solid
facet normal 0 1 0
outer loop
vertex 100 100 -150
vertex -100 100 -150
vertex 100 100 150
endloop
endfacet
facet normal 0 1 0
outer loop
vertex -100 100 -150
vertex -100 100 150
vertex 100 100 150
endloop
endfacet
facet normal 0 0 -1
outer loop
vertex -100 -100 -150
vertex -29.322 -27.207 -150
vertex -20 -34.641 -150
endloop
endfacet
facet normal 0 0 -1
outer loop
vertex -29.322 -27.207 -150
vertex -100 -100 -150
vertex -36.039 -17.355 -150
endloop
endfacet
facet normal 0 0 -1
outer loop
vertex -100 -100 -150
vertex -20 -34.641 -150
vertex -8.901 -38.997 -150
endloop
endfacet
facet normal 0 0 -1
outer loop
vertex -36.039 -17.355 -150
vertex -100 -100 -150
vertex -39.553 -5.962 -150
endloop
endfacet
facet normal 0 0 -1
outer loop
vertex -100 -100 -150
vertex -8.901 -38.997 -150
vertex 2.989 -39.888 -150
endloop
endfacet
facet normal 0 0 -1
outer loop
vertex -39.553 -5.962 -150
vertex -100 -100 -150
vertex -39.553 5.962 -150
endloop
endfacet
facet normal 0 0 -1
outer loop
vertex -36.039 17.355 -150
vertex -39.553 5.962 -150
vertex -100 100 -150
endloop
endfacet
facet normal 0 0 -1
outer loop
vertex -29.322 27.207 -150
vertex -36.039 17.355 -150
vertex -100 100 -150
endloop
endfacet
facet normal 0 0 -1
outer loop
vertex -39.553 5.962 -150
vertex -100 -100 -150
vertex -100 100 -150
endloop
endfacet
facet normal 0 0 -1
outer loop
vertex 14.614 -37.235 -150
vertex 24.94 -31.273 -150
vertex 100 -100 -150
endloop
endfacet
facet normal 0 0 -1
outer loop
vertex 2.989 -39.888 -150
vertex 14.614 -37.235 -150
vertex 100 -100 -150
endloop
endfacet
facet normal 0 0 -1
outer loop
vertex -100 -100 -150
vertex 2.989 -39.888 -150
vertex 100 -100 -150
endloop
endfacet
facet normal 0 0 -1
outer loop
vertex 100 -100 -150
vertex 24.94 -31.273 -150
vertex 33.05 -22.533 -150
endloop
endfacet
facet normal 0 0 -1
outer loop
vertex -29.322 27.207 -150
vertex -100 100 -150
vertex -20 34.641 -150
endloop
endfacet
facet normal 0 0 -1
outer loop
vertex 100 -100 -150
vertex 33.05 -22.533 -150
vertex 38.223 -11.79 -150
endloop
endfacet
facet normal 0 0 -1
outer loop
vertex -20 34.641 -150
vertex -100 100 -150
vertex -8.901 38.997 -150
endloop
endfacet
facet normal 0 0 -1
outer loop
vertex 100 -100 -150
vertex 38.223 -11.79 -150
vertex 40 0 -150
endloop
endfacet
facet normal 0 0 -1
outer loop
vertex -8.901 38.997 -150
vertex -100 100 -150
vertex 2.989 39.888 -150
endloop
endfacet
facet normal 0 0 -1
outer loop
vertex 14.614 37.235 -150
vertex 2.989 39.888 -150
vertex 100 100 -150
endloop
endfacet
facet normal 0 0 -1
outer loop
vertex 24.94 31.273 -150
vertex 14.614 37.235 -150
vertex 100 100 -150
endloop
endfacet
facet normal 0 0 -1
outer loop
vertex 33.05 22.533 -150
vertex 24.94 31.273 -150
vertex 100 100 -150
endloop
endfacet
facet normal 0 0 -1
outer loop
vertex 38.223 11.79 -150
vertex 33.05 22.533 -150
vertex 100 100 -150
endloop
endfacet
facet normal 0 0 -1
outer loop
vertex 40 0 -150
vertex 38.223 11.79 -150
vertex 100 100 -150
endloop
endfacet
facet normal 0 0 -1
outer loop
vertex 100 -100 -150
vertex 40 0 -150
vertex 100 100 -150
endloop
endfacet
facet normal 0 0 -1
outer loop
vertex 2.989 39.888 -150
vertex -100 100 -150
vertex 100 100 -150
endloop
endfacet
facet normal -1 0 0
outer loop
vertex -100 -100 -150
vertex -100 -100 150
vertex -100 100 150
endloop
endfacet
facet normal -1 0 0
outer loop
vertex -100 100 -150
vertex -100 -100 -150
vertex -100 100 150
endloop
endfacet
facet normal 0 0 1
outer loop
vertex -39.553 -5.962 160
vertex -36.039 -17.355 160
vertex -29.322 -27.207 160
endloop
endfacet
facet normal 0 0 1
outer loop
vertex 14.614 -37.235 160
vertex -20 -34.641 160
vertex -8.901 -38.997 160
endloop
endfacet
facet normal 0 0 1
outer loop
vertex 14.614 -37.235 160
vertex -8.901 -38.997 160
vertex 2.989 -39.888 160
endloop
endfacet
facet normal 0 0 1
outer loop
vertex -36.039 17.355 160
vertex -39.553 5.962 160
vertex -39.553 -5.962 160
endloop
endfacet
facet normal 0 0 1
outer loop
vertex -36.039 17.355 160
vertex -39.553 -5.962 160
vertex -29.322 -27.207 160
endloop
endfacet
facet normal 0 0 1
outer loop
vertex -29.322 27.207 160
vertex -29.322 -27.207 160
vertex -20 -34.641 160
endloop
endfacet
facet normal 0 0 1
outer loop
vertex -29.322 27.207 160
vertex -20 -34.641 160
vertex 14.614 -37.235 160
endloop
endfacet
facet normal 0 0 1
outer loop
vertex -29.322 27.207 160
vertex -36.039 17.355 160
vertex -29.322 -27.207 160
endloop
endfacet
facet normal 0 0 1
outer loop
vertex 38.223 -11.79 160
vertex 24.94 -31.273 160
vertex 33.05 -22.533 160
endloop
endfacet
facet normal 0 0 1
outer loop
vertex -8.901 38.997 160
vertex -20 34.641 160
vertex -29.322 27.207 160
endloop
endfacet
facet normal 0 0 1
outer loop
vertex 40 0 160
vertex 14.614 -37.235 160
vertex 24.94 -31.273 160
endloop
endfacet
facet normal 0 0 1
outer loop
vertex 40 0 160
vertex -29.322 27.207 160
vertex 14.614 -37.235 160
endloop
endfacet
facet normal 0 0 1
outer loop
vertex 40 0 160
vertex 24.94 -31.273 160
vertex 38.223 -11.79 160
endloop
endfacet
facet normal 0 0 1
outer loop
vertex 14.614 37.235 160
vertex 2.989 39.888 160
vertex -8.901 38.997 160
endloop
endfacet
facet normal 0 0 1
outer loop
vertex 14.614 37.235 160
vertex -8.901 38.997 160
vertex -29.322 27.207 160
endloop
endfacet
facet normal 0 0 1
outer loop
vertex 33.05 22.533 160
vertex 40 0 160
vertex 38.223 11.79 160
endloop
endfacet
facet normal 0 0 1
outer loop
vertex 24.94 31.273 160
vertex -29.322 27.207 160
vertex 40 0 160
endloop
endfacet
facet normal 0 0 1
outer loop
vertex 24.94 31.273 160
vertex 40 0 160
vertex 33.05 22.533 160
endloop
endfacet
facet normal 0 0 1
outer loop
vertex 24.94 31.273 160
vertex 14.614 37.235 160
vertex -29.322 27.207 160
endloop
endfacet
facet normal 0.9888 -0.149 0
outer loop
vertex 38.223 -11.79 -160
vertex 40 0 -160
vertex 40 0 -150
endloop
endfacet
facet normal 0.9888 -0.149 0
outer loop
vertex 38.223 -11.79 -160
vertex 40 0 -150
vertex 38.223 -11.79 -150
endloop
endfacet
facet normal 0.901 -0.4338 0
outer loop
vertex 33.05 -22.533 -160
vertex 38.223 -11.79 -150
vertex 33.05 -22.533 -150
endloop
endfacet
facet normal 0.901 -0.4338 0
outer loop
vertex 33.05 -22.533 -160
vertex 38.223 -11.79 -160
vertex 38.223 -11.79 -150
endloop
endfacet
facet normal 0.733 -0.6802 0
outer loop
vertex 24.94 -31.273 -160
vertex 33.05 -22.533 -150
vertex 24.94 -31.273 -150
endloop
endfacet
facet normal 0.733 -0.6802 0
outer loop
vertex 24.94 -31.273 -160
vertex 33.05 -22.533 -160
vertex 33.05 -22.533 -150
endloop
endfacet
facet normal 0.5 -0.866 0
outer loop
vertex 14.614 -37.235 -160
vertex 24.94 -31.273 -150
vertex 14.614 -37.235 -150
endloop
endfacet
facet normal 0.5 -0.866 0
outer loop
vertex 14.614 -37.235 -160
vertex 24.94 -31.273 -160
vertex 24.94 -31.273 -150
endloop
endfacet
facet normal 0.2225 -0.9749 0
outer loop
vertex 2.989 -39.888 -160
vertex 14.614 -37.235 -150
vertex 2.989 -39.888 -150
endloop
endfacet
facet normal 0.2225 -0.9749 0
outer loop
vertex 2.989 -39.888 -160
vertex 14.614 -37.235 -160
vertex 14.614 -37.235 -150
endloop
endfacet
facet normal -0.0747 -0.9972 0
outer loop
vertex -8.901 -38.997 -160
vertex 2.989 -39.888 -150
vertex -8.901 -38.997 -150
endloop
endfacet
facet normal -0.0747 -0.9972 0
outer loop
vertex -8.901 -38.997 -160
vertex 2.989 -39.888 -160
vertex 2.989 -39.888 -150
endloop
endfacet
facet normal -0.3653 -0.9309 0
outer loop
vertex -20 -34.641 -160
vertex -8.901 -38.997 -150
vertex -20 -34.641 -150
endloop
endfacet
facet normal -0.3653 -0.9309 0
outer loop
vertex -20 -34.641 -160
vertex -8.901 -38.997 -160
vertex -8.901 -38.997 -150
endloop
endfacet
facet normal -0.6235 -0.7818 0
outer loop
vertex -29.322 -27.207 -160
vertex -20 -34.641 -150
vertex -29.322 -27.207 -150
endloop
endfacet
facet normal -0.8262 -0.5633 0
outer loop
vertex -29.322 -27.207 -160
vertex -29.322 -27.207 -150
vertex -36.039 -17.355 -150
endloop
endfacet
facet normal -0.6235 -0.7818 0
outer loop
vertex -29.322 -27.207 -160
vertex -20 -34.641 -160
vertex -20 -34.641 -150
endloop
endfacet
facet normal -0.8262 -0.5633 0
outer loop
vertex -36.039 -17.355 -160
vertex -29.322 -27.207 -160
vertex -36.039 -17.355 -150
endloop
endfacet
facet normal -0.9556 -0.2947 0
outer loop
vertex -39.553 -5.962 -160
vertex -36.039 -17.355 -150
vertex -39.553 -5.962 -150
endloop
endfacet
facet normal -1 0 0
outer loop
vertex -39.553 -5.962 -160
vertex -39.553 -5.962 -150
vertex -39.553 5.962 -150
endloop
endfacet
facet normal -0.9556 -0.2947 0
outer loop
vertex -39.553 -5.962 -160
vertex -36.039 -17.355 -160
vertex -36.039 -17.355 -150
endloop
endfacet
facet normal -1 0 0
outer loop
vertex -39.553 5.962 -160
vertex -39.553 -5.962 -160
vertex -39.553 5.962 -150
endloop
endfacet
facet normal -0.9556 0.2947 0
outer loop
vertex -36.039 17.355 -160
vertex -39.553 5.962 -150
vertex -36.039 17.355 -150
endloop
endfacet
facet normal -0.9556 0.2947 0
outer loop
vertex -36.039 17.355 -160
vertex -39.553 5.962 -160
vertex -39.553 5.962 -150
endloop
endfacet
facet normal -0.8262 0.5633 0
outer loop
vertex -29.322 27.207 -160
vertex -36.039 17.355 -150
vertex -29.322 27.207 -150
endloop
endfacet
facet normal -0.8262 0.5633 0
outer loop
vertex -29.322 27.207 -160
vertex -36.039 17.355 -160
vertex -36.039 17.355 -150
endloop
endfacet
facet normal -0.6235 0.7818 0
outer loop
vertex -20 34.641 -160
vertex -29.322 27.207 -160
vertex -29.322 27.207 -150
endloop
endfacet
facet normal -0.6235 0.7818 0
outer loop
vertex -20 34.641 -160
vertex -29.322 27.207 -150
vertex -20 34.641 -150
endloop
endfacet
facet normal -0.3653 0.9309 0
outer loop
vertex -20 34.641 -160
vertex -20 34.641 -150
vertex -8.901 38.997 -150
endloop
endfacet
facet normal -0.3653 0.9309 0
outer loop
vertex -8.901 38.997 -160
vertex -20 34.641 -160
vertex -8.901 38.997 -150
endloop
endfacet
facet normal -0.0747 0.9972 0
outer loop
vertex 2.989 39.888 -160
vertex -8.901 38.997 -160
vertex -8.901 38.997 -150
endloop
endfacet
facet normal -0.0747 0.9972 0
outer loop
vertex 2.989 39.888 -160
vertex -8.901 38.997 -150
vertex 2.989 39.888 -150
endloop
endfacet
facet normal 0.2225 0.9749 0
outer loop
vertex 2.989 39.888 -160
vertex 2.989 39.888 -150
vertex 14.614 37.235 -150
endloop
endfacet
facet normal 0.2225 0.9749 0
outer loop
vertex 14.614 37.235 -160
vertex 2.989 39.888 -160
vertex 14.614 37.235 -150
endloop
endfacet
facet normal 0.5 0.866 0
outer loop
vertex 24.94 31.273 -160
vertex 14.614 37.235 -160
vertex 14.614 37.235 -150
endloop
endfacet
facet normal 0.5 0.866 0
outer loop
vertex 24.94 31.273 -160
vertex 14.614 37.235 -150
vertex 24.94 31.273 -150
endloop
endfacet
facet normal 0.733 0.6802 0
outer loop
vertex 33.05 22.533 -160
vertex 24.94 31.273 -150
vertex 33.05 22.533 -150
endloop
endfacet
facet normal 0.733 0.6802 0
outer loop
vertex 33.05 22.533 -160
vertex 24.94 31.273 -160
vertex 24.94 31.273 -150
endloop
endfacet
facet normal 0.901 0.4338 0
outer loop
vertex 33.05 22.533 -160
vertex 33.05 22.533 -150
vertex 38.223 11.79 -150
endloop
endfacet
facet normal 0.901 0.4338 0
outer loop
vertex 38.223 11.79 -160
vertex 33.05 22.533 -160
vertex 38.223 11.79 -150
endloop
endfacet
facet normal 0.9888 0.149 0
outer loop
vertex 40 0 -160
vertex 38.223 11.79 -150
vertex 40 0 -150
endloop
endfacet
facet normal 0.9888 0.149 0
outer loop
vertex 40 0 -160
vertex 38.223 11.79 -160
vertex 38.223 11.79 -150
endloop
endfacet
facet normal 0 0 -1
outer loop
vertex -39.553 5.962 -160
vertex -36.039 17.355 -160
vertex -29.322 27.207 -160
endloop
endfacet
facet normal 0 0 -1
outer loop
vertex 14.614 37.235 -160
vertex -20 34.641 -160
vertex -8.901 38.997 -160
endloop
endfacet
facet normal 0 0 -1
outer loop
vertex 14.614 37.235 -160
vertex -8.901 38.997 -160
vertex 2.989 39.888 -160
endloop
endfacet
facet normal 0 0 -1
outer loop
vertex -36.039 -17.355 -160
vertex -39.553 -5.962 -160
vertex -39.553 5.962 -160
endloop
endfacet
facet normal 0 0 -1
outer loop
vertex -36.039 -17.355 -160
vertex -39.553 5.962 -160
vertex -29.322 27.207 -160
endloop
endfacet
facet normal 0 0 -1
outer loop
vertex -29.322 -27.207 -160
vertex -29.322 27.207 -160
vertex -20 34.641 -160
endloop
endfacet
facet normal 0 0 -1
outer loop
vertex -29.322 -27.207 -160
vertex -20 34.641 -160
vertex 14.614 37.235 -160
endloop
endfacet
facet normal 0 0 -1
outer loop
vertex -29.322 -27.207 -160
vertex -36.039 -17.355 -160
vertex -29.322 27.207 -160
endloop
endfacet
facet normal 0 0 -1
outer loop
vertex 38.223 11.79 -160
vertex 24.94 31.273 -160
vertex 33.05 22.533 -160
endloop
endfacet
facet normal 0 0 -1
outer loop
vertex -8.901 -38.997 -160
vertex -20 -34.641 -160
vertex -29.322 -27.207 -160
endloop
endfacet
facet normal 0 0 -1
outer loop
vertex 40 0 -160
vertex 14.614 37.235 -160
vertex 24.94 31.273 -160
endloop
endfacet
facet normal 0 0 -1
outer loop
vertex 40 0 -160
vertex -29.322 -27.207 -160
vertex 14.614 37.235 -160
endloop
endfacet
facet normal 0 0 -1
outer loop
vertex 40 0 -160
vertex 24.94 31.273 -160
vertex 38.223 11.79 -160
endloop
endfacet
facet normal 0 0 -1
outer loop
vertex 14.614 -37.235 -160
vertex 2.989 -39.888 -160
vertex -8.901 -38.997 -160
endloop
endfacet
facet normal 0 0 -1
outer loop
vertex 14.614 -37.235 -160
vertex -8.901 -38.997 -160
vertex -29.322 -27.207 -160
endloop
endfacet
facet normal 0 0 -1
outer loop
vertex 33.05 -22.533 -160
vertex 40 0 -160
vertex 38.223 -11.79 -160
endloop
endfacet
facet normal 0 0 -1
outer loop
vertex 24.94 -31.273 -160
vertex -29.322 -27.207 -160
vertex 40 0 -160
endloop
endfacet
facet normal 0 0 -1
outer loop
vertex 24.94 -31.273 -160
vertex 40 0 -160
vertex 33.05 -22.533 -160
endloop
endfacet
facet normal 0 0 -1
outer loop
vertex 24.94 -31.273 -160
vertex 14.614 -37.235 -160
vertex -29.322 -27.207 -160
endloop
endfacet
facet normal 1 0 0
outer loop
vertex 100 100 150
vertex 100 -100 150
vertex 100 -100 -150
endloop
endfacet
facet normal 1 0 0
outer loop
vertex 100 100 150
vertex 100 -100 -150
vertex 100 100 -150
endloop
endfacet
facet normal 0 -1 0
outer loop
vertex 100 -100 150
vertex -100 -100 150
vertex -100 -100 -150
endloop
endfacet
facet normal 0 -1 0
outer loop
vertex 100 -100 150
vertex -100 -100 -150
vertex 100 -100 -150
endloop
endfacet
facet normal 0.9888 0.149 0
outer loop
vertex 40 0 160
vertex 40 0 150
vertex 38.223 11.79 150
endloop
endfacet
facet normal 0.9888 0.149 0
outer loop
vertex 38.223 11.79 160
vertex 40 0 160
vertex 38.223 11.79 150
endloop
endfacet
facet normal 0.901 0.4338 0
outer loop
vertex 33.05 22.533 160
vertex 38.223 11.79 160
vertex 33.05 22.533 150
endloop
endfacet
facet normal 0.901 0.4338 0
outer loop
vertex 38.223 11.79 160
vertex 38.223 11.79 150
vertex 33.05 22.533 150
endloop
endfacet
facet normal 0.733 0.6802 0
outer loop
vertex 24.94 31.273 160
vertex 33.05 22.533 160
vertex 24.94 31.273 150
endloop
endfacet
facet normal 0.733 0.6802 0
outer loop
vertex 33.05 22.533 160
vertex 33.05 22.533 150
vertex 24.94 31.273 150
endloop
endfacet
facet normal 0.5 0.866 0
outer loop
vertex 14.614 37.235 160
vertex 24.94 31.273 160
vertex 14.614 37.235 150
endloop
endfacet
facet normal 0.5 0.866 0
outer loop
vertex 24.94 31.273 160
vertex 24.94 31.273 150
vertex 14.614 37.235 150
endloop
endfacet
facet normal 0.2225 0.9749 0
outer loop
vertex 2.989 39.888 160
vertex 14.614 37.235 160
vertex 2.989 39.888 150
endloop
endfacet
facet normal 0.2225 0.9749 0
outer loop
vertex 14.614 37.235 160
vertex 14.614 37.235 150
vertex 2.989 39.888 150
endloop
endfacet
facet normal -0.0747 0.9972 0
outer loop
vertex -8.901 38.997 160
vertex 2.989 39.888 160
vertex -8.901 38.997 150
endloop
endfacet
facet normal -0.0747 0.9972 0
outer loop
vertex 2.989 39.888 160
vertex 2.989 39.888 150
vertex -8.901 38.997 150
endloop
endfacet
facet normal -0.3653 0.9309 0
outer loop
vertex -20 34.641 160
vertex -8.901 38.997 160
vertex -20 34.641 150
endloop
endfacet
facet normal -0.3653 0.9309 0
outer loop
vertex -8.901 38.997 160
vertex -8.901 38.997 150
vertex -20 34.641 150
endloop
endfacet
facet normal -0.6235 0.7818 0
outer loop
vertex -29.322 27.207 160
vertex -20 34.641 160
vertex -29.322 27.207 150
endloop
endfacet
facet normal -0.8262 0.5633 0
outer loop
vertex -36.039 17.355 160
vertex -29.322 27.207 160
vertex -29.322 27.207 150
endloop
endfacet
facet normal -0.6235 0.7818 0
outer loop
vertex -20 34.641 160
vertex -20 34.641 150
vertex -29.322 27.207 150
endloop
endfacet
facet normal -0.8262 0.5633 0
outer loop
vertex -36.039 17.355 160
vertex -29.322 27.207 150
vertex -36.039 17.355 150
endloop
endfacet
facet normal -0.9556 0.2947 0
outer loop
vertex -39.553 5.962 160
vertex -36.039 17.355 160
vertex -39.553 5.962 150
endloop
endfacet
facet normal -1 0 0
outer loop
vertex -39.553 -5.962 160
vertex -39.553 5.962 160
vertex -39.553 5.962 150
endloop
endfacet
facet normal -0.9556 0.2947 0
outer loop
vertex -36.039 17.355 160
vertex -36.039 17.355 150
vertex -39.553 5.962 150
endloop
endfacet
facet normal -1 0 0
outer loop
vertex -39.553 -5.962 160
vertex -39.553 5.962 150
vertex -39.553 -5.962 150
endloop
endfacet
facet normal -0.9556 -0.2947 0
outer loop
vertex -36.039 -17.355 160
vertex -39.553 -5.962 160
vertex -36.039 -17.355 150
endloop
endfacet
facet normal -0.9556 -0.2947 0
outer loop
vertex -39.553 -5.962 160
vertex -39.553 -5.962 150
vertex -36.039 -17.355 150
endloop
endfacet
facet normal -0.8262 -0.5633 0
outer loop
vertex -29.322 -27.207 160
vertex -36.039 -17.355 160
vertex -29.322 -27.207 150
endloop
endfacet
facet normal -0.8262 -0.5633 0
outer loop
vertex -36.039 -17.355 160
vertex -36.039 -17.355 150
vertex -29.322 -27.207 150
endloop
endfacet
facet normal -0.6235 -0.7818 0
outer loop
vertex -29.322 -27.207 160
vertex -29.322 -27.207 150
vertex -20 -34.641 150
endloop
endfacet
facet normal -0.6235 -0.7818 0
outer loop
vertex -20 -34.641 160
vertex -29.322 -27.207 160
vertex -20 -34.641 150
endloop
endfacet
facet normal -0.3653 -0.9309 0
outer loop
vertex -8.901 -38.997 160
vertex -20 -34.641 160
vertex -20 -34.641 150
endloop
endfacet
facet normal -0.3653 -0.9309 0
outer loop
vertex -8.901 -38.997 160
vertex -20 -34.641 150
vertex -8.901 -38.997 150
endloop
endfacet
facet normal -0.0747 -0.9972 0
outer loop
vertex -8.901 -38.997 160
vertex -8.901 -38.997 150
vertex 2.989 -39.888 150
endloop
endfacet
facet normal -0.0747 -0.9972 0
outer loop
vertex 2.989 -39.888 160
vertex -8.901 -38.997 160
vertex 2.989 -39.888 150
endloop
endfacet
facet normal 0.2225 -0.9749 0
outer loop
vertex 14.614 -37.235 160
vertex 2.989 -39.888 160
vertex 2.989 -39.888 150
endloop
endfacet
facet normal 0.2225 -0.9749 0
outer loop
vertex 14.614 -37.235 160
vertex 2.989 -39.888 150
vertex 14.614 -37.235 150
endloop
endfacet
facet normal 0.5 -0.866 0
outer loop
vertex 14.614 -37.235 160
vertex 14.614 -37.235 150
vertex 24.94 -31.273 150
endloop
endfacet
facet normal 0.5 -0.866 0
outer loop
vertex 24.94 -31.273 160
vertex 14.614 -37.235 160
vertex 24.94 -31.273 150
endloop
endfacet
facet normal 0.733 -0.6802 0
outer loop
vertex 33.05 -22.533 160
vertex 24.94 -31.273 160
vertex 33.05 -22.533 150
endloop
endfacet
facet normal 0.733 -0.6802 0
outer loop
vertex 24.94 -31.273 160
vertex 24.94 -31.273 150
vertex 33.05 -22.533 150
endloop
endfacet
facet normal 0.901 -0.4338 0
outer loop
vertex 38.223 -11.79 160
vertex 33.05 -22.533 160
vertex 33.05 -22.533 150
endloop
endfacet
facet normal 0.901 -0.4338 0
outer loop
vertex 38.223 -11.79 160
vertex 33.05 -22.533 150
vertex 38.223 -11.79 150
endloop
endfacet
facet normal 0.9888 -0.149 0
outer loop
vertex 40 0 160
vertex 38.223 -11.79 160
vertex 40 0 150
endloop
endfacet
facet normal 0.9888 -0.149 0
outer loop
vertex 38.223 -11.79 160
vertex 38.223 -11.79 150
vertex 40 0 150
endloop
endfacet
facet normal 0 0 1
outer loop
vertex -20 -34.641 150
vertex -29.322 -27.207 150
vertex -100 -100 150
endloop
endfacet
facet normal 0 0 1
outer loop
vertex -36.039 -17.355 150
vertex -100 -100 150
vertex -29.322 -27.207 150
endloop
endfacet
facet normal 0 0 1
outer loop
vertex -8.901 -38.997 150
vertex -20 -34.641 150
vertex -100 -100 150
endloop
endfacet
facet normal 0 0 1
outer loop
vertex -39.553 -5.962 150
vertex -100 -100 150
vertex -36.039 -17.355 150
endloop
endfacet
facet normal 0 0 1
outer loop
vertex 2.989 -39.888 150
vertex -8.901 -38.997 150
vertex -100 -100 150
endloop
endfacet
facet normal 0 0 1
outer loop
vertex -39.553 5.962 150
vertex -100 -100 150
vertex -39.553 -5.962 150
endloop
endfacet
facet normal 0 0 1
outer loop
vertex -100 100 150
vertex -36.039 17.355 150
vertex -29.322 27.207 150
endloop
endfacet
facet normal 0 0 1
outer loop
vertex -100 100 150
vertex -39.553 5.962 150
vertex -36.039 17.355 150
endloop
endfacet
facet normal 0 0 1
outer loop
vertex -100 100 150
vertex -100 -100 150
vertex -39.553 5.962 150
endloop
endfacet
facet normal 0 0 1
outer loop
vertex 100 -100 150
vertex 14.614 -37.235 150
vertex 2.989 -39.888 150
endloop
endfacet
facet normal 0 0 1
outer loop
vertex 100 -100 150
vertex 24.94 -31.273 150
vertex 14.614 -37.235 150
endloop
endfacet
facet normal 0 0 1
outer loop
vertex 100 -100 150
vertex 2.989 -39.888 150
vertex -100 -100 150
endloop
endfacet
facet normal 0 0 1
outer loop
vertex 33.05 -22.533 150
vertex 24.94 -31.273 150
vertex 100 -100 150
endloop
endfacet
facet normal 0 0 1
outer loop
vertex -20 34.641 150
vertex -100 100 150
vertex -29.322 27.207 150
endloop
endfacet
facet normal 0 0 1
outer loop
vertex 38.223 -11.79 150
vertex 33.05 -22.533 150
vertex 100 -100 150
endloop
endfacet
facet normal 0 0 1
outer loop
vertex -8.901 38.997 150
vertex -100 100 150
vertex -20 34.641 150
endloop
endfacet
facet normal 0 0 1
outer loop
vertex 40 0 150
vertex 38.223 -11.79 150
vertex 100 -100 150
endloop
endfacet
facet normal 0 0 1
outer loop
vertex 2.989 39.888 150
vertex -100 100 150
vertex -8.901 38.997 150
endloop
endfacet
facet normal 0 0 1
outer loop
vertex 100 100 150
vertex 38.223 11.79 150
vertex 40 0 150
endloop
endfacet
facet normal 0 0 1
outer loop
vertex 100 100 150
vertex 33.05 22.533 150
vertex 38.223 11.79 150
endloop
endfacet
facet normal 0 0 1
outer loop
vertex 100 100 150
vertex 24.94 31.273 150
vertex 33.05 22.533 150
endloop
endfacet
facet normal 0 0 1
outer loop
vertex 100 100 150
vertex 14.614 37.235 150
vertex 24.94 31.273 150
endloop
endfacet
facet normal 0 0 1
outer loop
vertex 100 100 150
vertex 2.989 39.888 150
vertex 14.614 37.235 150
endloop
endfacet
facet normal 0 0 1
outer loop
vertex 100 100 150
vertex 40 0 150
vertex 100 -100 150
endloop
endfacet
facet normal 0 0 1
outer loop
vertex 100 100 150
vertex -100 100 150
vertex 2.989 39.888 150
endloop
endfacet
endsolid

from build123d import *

# Parameters (mm, degrees)
SKETCH_1_W      = 200
SKETCH_1_H      = 200
EXTRUDE_1_DEPTH = 150
SKETCH_2_R      = 40
EXTRUDE_2_DEPTH = 10
EXTRUDE_START   = 10
SKETCH_3_R      = 40
EXTRUDE_3_DEPTH = 10


with BuildPart() as part:
    # 草图1 → 凸台-拉伸1 (new, symmetric)
    with BuildSketch(Plane.XY):
        Rectangle(SKETCH_1_W, SKETCH_1_H)
    extrude(amount=EXTRUDE_1_DEPTH, both=True)

    # 草图2 → 凸台-拉伸2 (add)
    with BuildSketch(Plane.XY.offset(150)):
        Circle(SKETCH_2_R)
    extrude(amount=EXTRUDE_2_DEPTH)

    # 草图3 → 凸台-拉伸3 (add)
    with BuildSketch(Plane(origin=(0, 0, -150), x_dir=(-1, 0, 0), z_dir=(0, 0, -1)).offset(EXTRUDE_START)):
        with Locations(Location((0, 0, 0), (0, 0, 180))):
            Circle(SKETCH_3_R)
    extrude(amount=-EXTRUDE_3_DEPTH)


solid = part.part
